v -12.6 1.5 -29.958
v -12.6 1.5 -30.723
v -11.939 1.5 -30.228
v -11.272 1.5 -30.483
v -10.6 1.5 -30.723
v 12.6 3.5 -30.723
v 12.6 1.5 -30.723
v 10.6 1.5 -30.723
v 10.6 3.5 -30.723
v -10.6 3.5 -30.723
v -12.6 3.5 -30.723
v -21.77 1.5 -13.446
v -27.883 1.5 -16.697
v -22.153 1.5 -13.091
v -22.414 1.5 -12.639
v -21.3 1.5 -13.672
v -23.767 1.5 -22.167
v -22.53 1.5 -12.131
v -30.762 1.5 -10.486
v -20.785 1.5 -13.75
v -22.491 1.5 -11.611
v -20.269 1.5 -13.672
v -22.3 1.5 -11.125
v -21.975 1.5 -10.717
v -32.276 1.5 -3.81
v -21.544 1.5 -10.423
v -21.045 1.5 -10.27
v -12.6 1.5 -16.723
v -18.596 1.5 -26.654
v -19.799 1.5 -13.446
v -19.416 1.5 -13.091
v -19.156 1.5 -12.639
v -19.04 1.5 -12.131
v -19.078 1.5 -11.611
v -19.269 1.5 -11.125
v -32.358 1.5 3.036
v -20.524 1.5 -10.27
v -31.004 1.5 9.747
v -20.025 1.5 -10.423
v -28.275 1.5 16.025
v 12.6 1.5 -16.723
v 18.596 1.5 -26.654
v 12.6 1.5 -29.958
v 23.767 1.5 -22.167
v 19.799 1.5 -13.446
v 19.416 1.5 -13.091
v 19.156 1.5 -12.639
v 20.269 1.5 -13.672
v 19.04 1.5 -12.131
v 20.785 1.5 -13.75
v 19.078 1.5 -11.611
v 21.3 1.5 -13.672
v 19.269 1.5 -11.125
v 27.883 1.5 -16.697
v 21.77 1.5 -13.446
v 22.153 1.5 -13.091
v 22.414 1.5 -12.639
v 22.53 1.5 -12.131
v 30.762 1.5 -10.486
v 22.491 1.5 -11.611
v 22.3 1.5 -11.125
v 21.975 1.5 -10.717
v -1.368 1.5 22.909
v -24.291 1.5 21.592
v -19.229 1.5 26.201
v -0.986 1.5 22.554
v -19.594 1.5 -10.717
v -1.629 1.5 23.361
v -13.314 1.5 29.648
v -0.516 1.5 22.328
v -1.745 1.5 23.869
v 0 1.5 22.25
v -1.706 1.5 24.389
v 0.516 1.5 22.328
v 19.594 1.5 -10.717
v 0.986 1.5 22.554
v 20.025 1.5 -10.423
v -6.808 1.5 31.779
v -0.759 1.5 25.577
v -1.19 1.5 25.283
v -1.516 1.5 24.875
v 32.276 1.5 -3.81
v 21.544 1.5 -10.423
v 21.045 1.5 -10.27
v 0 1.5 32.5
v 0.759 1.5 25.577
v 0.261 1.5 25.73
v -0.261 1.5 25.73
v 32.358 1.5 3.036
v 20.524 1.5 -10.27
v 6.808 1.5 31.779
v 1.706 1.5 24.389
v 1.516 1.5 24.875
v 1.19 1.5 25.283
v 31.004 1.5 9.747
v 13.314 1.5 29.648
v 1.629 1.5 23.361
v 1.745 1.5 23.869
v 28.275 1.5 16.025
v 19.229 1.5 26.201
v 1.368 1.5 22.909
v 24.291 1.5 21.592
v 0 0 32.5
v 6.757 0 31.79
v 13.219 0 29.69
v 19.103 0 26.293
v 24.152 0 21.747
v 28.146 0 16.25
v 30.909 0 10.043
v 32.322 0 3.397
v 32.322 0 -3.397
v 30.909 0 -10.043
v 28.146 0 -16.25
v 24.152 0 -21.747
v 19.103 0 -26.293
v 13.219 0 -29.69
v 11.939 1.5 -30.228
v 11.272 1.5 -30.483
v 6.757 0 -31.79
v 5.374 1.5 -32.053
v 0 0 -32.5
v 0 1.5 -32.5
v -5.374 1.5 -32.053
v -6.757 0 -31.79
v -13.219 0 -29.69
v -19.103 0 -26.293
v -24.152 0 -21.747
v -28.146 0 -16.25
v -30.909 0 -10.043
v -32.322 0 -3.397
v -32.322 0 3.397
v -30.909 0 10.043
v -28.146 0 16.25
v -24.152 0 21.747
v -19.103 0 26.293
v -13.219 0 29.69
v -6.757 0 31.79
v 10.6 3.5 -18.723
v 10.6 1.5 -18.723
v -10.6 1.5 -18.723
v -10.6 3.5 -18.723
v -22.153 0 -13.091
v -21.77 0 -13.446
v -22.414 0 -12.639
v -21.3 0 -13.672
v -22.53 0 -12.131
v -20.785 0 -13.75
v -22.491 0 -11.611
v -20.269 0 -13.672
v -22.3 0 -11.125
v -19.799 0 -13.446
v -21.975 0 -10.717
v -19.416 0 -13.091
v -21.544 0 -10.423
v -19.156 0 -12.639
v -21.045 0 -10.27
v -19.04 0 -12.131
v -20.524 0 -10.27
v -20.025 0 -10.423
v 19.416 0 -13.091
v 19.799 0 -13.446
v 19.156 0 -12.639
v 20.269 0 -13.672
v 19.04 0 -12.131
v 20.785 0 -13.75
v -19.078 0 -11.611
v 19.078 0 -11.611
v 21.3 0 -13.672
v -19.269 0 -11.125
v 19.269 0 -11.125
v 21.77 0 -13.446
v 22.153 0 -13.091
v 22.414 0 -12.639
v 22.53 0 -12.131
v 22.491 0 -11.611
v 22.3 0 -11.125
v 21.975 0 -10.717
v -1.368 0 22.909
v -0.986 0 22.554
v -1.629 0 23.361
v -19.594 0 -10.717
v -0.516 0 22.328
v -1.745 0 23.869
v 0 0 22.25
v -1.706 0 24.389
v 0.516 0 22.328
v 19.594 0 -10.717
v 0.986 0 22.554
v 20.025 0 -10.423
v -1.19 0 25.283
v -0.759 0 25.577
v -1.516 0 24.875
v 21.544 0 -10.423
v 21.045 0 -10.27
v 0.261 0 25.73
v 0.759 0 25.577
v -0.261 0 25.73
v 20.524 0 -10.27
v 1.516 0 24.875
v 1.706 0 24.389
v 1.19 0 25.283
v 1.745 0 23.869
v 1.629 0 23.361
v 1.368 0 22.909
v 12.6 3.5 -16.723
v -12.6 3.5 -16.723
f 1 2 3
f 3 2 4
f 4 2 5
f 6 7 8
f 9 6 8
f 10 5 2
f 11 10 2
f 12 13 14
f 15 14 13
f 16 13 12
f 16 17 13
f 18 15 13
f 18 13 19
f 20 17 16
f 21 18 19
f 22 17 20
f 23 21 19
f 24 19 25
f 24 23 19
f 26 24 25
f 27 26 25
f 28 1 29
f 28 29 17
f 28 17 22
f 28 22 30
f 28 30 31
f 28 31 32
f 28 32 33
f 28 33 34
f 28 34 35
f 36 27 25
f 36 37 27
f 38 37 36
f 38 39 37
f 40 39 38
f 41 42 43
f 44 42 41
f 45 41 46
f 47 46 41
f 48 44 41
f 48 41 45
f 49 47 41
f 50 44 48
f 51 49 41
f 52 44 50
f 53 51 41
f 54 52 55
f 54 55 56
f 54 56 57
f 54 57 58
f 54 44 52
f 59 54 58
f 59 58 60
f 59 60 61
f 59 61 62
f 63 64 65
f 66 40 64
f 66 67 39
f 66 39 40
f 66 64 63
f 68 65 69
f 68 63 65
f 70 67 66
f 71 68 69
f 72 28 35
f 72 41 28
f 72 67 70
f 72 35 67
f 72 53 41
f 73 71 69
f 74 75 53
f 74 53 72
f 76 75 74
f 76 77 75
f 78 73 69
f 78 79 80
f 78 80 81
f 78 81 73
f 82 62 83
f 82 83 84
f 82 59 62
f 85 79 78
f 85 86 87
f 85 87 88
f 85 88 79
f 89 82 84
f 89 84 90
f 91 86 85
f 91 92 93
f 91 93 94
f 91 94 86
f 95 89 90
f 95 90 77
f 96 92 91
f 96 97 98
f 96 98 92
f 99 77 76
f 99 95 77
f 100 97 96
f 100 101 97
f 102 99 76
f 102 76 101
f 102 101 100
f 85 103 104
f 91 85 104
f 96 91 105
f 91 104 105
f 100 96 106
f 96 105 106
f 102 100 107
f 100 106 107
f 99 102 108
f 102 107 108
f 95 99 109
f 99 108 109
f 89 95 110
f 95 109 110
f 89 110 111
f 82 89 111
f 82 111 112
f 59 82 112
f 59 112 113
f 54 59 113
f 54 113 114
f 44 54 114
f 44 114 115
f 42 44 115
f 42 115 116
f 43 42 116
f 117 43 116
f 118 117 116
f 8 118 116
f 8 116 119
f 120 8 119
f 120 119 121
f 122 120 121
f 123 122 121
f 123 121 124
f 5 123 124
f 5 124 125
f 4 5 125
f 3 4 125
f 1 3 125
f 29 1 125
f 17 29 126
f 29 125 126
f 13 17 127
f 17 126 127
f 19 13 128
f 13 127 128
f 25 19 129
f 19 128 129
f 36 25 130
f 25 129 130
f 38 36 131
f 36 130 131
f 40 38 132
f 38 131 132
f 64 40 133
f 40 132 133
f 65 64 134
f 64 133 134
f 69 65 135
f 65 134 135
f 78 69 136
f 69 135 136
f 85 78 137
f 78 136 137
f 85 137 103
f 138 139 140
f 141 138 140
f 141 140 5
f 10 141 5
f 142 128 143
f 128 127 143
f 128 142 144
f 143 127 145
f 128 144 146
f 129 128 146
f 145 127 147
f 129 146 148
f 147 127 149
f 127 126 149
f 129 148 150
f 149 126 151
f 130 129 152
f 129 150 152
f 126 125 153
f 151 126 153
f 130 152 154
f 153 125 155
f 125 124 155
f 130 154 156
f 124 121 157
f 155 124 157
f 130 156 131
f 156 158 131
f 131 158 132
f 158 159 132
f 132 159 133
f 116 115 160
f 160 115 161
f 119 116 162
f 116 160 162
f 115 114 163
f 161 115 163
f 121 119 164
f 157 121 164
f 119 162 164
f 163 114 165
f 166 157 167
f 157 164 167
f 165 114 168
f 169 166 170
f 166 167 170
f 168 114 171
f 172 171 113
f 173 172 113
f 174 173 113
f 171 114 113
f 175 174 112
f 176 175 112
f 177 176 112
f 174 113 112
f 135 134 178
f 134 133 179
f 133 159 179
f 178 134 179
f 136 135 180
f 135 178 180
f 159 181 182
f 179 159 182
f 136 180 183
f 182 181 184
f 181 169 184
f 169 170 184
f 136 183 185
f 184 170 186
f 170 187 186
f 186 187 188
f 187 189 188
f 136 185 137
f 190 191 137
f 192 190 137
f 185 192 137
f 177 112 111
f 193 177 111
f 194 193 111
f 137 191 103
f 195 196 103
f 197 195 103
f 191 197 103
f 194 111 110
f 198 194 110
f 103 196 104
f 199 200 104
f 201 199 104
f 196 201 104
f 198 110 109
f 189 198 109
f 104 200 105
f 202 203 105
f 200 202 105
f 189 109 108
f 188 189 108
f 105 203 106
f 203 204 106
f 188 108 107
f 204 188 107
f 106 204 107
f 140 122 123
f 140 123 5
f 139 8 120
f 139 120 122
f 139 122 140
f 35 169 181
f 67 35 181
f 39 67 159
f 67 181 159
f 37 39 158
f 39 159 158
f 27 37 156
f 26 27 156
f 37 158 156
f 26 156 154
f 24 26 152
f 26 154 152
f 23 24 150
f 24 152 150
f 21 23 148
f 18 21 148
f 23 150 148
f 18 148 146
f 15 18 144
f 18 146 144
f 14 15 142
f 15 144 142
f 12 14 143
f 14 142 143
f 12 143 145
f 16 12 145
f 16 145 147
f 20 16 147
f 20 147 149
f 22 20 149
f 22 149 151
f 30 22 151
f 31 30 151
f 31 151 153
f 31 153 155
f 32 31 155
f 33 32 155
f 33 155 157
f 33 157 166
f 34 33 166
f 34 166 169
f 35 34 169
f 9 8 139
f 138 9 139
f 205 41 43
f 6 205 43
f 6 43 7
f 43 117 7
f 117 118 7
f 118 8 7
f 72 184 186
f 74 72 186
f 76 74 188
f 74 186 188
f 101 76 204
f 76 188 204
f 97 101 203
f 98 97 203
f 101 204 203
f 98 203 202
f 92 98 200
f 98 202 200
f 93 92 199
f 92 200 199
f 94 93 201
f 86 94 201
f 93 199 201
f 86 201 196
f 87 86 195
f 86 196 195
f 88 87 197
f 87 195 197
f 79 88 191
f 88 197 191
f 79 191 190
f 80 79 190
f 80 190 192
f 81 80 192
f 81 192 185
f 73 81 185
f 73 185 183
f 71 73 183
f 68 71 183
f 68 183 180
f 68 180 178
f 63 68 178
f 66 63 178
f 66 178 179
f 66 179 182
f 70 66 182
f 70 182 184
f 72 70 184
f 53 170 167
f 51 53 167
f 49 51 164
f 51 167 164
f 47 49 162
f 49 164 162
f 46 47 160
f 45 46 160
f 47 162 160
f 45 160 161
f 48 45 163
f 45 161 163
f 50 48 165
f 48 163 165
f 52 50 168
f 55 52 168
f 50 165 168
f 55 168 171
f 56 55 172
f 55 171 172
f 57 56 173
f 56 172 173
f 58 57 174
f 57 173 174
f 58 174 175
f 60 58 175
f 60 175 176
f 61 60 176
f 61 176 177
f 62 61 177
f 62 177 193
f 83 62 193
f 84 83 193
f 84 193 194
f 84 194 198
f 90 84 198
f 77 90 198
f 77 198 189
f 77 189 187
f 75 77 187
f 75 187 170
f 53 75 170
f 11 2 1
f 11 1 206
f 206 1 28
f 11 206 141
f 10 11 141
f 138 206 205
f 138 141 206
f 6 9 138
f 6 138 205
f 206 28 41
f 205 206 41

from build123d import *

# Parameters (mm, degrees)
SKETCH_1_R               = 32.5
EXTRUDE_1_DEPTH          = 1.5
EXTRUDE_4_DEPTH          = 2
SKETCH_2_R               = 1.75
CUT_EXTRUDE_1_DEPTH      = 7
PATTERN_CIRCULAR_1_COUNT = 3


with BuildPart() as part:
    # 草图1 → 凸台-拉伸1 (new body)
    with BuildSketch(Plane(origin=(0, 0, 0), x_dir=(1, 0, 0), z_dir=(0, 1, 0))):
        with Locations(Location((0, 0, 0), (0, 0, 270))):
            Circle(SKETCH_1_R)
    extrude(amount=EXTRUDE_1_DEPTH)

    # 草图4 → 凸台-拉伸4 (add)
    with BuildSketch(Plane(origin=(0, 1.5, 0), x_dir=(1, 0, 0), z_dir=(0, 1, 0))):
        Polygon((-12.6, 30.722792842), (-12.6, 16.722792842), (12.6, 16.722792842), (12.6, 30.722792842), (10.6, 30.722792842), (10.6, 18.722792842), (-10.6, 18.722792842), (-10.6, 30.722792842), align=None)
    extrude(amount=EXTRUDE_4_DEPTH)

    # 草图2 → 切除-拉伸1 (cut)
    with BuildSketch(Plane.XZ):
        with Locations(Location((0, 24, 0), (0, 0, 270))):
            Circle(SKETCH_2_R)
    cut_extrude_1 = extrude(amount=-CUT_EXTRUDE_1_DEPTH, mode=Mode.SUBTRACT)

    # 阵列(圆周)1: 切除-拉伸1 ×3 about axis
    pattern_circular_1_axis = Axis((0, 0, 0), (0, 1, 0))
    for i in range(1, PATTERN_CIRCULAR_1_COUNT):
        add(cut_extrude_1.rotate(pattern_circular_1_axis, i * 360 / PATTERN_CIRCULAR_1_COUNT), mode=Mode.SUBTRACT)


solid = part.part
